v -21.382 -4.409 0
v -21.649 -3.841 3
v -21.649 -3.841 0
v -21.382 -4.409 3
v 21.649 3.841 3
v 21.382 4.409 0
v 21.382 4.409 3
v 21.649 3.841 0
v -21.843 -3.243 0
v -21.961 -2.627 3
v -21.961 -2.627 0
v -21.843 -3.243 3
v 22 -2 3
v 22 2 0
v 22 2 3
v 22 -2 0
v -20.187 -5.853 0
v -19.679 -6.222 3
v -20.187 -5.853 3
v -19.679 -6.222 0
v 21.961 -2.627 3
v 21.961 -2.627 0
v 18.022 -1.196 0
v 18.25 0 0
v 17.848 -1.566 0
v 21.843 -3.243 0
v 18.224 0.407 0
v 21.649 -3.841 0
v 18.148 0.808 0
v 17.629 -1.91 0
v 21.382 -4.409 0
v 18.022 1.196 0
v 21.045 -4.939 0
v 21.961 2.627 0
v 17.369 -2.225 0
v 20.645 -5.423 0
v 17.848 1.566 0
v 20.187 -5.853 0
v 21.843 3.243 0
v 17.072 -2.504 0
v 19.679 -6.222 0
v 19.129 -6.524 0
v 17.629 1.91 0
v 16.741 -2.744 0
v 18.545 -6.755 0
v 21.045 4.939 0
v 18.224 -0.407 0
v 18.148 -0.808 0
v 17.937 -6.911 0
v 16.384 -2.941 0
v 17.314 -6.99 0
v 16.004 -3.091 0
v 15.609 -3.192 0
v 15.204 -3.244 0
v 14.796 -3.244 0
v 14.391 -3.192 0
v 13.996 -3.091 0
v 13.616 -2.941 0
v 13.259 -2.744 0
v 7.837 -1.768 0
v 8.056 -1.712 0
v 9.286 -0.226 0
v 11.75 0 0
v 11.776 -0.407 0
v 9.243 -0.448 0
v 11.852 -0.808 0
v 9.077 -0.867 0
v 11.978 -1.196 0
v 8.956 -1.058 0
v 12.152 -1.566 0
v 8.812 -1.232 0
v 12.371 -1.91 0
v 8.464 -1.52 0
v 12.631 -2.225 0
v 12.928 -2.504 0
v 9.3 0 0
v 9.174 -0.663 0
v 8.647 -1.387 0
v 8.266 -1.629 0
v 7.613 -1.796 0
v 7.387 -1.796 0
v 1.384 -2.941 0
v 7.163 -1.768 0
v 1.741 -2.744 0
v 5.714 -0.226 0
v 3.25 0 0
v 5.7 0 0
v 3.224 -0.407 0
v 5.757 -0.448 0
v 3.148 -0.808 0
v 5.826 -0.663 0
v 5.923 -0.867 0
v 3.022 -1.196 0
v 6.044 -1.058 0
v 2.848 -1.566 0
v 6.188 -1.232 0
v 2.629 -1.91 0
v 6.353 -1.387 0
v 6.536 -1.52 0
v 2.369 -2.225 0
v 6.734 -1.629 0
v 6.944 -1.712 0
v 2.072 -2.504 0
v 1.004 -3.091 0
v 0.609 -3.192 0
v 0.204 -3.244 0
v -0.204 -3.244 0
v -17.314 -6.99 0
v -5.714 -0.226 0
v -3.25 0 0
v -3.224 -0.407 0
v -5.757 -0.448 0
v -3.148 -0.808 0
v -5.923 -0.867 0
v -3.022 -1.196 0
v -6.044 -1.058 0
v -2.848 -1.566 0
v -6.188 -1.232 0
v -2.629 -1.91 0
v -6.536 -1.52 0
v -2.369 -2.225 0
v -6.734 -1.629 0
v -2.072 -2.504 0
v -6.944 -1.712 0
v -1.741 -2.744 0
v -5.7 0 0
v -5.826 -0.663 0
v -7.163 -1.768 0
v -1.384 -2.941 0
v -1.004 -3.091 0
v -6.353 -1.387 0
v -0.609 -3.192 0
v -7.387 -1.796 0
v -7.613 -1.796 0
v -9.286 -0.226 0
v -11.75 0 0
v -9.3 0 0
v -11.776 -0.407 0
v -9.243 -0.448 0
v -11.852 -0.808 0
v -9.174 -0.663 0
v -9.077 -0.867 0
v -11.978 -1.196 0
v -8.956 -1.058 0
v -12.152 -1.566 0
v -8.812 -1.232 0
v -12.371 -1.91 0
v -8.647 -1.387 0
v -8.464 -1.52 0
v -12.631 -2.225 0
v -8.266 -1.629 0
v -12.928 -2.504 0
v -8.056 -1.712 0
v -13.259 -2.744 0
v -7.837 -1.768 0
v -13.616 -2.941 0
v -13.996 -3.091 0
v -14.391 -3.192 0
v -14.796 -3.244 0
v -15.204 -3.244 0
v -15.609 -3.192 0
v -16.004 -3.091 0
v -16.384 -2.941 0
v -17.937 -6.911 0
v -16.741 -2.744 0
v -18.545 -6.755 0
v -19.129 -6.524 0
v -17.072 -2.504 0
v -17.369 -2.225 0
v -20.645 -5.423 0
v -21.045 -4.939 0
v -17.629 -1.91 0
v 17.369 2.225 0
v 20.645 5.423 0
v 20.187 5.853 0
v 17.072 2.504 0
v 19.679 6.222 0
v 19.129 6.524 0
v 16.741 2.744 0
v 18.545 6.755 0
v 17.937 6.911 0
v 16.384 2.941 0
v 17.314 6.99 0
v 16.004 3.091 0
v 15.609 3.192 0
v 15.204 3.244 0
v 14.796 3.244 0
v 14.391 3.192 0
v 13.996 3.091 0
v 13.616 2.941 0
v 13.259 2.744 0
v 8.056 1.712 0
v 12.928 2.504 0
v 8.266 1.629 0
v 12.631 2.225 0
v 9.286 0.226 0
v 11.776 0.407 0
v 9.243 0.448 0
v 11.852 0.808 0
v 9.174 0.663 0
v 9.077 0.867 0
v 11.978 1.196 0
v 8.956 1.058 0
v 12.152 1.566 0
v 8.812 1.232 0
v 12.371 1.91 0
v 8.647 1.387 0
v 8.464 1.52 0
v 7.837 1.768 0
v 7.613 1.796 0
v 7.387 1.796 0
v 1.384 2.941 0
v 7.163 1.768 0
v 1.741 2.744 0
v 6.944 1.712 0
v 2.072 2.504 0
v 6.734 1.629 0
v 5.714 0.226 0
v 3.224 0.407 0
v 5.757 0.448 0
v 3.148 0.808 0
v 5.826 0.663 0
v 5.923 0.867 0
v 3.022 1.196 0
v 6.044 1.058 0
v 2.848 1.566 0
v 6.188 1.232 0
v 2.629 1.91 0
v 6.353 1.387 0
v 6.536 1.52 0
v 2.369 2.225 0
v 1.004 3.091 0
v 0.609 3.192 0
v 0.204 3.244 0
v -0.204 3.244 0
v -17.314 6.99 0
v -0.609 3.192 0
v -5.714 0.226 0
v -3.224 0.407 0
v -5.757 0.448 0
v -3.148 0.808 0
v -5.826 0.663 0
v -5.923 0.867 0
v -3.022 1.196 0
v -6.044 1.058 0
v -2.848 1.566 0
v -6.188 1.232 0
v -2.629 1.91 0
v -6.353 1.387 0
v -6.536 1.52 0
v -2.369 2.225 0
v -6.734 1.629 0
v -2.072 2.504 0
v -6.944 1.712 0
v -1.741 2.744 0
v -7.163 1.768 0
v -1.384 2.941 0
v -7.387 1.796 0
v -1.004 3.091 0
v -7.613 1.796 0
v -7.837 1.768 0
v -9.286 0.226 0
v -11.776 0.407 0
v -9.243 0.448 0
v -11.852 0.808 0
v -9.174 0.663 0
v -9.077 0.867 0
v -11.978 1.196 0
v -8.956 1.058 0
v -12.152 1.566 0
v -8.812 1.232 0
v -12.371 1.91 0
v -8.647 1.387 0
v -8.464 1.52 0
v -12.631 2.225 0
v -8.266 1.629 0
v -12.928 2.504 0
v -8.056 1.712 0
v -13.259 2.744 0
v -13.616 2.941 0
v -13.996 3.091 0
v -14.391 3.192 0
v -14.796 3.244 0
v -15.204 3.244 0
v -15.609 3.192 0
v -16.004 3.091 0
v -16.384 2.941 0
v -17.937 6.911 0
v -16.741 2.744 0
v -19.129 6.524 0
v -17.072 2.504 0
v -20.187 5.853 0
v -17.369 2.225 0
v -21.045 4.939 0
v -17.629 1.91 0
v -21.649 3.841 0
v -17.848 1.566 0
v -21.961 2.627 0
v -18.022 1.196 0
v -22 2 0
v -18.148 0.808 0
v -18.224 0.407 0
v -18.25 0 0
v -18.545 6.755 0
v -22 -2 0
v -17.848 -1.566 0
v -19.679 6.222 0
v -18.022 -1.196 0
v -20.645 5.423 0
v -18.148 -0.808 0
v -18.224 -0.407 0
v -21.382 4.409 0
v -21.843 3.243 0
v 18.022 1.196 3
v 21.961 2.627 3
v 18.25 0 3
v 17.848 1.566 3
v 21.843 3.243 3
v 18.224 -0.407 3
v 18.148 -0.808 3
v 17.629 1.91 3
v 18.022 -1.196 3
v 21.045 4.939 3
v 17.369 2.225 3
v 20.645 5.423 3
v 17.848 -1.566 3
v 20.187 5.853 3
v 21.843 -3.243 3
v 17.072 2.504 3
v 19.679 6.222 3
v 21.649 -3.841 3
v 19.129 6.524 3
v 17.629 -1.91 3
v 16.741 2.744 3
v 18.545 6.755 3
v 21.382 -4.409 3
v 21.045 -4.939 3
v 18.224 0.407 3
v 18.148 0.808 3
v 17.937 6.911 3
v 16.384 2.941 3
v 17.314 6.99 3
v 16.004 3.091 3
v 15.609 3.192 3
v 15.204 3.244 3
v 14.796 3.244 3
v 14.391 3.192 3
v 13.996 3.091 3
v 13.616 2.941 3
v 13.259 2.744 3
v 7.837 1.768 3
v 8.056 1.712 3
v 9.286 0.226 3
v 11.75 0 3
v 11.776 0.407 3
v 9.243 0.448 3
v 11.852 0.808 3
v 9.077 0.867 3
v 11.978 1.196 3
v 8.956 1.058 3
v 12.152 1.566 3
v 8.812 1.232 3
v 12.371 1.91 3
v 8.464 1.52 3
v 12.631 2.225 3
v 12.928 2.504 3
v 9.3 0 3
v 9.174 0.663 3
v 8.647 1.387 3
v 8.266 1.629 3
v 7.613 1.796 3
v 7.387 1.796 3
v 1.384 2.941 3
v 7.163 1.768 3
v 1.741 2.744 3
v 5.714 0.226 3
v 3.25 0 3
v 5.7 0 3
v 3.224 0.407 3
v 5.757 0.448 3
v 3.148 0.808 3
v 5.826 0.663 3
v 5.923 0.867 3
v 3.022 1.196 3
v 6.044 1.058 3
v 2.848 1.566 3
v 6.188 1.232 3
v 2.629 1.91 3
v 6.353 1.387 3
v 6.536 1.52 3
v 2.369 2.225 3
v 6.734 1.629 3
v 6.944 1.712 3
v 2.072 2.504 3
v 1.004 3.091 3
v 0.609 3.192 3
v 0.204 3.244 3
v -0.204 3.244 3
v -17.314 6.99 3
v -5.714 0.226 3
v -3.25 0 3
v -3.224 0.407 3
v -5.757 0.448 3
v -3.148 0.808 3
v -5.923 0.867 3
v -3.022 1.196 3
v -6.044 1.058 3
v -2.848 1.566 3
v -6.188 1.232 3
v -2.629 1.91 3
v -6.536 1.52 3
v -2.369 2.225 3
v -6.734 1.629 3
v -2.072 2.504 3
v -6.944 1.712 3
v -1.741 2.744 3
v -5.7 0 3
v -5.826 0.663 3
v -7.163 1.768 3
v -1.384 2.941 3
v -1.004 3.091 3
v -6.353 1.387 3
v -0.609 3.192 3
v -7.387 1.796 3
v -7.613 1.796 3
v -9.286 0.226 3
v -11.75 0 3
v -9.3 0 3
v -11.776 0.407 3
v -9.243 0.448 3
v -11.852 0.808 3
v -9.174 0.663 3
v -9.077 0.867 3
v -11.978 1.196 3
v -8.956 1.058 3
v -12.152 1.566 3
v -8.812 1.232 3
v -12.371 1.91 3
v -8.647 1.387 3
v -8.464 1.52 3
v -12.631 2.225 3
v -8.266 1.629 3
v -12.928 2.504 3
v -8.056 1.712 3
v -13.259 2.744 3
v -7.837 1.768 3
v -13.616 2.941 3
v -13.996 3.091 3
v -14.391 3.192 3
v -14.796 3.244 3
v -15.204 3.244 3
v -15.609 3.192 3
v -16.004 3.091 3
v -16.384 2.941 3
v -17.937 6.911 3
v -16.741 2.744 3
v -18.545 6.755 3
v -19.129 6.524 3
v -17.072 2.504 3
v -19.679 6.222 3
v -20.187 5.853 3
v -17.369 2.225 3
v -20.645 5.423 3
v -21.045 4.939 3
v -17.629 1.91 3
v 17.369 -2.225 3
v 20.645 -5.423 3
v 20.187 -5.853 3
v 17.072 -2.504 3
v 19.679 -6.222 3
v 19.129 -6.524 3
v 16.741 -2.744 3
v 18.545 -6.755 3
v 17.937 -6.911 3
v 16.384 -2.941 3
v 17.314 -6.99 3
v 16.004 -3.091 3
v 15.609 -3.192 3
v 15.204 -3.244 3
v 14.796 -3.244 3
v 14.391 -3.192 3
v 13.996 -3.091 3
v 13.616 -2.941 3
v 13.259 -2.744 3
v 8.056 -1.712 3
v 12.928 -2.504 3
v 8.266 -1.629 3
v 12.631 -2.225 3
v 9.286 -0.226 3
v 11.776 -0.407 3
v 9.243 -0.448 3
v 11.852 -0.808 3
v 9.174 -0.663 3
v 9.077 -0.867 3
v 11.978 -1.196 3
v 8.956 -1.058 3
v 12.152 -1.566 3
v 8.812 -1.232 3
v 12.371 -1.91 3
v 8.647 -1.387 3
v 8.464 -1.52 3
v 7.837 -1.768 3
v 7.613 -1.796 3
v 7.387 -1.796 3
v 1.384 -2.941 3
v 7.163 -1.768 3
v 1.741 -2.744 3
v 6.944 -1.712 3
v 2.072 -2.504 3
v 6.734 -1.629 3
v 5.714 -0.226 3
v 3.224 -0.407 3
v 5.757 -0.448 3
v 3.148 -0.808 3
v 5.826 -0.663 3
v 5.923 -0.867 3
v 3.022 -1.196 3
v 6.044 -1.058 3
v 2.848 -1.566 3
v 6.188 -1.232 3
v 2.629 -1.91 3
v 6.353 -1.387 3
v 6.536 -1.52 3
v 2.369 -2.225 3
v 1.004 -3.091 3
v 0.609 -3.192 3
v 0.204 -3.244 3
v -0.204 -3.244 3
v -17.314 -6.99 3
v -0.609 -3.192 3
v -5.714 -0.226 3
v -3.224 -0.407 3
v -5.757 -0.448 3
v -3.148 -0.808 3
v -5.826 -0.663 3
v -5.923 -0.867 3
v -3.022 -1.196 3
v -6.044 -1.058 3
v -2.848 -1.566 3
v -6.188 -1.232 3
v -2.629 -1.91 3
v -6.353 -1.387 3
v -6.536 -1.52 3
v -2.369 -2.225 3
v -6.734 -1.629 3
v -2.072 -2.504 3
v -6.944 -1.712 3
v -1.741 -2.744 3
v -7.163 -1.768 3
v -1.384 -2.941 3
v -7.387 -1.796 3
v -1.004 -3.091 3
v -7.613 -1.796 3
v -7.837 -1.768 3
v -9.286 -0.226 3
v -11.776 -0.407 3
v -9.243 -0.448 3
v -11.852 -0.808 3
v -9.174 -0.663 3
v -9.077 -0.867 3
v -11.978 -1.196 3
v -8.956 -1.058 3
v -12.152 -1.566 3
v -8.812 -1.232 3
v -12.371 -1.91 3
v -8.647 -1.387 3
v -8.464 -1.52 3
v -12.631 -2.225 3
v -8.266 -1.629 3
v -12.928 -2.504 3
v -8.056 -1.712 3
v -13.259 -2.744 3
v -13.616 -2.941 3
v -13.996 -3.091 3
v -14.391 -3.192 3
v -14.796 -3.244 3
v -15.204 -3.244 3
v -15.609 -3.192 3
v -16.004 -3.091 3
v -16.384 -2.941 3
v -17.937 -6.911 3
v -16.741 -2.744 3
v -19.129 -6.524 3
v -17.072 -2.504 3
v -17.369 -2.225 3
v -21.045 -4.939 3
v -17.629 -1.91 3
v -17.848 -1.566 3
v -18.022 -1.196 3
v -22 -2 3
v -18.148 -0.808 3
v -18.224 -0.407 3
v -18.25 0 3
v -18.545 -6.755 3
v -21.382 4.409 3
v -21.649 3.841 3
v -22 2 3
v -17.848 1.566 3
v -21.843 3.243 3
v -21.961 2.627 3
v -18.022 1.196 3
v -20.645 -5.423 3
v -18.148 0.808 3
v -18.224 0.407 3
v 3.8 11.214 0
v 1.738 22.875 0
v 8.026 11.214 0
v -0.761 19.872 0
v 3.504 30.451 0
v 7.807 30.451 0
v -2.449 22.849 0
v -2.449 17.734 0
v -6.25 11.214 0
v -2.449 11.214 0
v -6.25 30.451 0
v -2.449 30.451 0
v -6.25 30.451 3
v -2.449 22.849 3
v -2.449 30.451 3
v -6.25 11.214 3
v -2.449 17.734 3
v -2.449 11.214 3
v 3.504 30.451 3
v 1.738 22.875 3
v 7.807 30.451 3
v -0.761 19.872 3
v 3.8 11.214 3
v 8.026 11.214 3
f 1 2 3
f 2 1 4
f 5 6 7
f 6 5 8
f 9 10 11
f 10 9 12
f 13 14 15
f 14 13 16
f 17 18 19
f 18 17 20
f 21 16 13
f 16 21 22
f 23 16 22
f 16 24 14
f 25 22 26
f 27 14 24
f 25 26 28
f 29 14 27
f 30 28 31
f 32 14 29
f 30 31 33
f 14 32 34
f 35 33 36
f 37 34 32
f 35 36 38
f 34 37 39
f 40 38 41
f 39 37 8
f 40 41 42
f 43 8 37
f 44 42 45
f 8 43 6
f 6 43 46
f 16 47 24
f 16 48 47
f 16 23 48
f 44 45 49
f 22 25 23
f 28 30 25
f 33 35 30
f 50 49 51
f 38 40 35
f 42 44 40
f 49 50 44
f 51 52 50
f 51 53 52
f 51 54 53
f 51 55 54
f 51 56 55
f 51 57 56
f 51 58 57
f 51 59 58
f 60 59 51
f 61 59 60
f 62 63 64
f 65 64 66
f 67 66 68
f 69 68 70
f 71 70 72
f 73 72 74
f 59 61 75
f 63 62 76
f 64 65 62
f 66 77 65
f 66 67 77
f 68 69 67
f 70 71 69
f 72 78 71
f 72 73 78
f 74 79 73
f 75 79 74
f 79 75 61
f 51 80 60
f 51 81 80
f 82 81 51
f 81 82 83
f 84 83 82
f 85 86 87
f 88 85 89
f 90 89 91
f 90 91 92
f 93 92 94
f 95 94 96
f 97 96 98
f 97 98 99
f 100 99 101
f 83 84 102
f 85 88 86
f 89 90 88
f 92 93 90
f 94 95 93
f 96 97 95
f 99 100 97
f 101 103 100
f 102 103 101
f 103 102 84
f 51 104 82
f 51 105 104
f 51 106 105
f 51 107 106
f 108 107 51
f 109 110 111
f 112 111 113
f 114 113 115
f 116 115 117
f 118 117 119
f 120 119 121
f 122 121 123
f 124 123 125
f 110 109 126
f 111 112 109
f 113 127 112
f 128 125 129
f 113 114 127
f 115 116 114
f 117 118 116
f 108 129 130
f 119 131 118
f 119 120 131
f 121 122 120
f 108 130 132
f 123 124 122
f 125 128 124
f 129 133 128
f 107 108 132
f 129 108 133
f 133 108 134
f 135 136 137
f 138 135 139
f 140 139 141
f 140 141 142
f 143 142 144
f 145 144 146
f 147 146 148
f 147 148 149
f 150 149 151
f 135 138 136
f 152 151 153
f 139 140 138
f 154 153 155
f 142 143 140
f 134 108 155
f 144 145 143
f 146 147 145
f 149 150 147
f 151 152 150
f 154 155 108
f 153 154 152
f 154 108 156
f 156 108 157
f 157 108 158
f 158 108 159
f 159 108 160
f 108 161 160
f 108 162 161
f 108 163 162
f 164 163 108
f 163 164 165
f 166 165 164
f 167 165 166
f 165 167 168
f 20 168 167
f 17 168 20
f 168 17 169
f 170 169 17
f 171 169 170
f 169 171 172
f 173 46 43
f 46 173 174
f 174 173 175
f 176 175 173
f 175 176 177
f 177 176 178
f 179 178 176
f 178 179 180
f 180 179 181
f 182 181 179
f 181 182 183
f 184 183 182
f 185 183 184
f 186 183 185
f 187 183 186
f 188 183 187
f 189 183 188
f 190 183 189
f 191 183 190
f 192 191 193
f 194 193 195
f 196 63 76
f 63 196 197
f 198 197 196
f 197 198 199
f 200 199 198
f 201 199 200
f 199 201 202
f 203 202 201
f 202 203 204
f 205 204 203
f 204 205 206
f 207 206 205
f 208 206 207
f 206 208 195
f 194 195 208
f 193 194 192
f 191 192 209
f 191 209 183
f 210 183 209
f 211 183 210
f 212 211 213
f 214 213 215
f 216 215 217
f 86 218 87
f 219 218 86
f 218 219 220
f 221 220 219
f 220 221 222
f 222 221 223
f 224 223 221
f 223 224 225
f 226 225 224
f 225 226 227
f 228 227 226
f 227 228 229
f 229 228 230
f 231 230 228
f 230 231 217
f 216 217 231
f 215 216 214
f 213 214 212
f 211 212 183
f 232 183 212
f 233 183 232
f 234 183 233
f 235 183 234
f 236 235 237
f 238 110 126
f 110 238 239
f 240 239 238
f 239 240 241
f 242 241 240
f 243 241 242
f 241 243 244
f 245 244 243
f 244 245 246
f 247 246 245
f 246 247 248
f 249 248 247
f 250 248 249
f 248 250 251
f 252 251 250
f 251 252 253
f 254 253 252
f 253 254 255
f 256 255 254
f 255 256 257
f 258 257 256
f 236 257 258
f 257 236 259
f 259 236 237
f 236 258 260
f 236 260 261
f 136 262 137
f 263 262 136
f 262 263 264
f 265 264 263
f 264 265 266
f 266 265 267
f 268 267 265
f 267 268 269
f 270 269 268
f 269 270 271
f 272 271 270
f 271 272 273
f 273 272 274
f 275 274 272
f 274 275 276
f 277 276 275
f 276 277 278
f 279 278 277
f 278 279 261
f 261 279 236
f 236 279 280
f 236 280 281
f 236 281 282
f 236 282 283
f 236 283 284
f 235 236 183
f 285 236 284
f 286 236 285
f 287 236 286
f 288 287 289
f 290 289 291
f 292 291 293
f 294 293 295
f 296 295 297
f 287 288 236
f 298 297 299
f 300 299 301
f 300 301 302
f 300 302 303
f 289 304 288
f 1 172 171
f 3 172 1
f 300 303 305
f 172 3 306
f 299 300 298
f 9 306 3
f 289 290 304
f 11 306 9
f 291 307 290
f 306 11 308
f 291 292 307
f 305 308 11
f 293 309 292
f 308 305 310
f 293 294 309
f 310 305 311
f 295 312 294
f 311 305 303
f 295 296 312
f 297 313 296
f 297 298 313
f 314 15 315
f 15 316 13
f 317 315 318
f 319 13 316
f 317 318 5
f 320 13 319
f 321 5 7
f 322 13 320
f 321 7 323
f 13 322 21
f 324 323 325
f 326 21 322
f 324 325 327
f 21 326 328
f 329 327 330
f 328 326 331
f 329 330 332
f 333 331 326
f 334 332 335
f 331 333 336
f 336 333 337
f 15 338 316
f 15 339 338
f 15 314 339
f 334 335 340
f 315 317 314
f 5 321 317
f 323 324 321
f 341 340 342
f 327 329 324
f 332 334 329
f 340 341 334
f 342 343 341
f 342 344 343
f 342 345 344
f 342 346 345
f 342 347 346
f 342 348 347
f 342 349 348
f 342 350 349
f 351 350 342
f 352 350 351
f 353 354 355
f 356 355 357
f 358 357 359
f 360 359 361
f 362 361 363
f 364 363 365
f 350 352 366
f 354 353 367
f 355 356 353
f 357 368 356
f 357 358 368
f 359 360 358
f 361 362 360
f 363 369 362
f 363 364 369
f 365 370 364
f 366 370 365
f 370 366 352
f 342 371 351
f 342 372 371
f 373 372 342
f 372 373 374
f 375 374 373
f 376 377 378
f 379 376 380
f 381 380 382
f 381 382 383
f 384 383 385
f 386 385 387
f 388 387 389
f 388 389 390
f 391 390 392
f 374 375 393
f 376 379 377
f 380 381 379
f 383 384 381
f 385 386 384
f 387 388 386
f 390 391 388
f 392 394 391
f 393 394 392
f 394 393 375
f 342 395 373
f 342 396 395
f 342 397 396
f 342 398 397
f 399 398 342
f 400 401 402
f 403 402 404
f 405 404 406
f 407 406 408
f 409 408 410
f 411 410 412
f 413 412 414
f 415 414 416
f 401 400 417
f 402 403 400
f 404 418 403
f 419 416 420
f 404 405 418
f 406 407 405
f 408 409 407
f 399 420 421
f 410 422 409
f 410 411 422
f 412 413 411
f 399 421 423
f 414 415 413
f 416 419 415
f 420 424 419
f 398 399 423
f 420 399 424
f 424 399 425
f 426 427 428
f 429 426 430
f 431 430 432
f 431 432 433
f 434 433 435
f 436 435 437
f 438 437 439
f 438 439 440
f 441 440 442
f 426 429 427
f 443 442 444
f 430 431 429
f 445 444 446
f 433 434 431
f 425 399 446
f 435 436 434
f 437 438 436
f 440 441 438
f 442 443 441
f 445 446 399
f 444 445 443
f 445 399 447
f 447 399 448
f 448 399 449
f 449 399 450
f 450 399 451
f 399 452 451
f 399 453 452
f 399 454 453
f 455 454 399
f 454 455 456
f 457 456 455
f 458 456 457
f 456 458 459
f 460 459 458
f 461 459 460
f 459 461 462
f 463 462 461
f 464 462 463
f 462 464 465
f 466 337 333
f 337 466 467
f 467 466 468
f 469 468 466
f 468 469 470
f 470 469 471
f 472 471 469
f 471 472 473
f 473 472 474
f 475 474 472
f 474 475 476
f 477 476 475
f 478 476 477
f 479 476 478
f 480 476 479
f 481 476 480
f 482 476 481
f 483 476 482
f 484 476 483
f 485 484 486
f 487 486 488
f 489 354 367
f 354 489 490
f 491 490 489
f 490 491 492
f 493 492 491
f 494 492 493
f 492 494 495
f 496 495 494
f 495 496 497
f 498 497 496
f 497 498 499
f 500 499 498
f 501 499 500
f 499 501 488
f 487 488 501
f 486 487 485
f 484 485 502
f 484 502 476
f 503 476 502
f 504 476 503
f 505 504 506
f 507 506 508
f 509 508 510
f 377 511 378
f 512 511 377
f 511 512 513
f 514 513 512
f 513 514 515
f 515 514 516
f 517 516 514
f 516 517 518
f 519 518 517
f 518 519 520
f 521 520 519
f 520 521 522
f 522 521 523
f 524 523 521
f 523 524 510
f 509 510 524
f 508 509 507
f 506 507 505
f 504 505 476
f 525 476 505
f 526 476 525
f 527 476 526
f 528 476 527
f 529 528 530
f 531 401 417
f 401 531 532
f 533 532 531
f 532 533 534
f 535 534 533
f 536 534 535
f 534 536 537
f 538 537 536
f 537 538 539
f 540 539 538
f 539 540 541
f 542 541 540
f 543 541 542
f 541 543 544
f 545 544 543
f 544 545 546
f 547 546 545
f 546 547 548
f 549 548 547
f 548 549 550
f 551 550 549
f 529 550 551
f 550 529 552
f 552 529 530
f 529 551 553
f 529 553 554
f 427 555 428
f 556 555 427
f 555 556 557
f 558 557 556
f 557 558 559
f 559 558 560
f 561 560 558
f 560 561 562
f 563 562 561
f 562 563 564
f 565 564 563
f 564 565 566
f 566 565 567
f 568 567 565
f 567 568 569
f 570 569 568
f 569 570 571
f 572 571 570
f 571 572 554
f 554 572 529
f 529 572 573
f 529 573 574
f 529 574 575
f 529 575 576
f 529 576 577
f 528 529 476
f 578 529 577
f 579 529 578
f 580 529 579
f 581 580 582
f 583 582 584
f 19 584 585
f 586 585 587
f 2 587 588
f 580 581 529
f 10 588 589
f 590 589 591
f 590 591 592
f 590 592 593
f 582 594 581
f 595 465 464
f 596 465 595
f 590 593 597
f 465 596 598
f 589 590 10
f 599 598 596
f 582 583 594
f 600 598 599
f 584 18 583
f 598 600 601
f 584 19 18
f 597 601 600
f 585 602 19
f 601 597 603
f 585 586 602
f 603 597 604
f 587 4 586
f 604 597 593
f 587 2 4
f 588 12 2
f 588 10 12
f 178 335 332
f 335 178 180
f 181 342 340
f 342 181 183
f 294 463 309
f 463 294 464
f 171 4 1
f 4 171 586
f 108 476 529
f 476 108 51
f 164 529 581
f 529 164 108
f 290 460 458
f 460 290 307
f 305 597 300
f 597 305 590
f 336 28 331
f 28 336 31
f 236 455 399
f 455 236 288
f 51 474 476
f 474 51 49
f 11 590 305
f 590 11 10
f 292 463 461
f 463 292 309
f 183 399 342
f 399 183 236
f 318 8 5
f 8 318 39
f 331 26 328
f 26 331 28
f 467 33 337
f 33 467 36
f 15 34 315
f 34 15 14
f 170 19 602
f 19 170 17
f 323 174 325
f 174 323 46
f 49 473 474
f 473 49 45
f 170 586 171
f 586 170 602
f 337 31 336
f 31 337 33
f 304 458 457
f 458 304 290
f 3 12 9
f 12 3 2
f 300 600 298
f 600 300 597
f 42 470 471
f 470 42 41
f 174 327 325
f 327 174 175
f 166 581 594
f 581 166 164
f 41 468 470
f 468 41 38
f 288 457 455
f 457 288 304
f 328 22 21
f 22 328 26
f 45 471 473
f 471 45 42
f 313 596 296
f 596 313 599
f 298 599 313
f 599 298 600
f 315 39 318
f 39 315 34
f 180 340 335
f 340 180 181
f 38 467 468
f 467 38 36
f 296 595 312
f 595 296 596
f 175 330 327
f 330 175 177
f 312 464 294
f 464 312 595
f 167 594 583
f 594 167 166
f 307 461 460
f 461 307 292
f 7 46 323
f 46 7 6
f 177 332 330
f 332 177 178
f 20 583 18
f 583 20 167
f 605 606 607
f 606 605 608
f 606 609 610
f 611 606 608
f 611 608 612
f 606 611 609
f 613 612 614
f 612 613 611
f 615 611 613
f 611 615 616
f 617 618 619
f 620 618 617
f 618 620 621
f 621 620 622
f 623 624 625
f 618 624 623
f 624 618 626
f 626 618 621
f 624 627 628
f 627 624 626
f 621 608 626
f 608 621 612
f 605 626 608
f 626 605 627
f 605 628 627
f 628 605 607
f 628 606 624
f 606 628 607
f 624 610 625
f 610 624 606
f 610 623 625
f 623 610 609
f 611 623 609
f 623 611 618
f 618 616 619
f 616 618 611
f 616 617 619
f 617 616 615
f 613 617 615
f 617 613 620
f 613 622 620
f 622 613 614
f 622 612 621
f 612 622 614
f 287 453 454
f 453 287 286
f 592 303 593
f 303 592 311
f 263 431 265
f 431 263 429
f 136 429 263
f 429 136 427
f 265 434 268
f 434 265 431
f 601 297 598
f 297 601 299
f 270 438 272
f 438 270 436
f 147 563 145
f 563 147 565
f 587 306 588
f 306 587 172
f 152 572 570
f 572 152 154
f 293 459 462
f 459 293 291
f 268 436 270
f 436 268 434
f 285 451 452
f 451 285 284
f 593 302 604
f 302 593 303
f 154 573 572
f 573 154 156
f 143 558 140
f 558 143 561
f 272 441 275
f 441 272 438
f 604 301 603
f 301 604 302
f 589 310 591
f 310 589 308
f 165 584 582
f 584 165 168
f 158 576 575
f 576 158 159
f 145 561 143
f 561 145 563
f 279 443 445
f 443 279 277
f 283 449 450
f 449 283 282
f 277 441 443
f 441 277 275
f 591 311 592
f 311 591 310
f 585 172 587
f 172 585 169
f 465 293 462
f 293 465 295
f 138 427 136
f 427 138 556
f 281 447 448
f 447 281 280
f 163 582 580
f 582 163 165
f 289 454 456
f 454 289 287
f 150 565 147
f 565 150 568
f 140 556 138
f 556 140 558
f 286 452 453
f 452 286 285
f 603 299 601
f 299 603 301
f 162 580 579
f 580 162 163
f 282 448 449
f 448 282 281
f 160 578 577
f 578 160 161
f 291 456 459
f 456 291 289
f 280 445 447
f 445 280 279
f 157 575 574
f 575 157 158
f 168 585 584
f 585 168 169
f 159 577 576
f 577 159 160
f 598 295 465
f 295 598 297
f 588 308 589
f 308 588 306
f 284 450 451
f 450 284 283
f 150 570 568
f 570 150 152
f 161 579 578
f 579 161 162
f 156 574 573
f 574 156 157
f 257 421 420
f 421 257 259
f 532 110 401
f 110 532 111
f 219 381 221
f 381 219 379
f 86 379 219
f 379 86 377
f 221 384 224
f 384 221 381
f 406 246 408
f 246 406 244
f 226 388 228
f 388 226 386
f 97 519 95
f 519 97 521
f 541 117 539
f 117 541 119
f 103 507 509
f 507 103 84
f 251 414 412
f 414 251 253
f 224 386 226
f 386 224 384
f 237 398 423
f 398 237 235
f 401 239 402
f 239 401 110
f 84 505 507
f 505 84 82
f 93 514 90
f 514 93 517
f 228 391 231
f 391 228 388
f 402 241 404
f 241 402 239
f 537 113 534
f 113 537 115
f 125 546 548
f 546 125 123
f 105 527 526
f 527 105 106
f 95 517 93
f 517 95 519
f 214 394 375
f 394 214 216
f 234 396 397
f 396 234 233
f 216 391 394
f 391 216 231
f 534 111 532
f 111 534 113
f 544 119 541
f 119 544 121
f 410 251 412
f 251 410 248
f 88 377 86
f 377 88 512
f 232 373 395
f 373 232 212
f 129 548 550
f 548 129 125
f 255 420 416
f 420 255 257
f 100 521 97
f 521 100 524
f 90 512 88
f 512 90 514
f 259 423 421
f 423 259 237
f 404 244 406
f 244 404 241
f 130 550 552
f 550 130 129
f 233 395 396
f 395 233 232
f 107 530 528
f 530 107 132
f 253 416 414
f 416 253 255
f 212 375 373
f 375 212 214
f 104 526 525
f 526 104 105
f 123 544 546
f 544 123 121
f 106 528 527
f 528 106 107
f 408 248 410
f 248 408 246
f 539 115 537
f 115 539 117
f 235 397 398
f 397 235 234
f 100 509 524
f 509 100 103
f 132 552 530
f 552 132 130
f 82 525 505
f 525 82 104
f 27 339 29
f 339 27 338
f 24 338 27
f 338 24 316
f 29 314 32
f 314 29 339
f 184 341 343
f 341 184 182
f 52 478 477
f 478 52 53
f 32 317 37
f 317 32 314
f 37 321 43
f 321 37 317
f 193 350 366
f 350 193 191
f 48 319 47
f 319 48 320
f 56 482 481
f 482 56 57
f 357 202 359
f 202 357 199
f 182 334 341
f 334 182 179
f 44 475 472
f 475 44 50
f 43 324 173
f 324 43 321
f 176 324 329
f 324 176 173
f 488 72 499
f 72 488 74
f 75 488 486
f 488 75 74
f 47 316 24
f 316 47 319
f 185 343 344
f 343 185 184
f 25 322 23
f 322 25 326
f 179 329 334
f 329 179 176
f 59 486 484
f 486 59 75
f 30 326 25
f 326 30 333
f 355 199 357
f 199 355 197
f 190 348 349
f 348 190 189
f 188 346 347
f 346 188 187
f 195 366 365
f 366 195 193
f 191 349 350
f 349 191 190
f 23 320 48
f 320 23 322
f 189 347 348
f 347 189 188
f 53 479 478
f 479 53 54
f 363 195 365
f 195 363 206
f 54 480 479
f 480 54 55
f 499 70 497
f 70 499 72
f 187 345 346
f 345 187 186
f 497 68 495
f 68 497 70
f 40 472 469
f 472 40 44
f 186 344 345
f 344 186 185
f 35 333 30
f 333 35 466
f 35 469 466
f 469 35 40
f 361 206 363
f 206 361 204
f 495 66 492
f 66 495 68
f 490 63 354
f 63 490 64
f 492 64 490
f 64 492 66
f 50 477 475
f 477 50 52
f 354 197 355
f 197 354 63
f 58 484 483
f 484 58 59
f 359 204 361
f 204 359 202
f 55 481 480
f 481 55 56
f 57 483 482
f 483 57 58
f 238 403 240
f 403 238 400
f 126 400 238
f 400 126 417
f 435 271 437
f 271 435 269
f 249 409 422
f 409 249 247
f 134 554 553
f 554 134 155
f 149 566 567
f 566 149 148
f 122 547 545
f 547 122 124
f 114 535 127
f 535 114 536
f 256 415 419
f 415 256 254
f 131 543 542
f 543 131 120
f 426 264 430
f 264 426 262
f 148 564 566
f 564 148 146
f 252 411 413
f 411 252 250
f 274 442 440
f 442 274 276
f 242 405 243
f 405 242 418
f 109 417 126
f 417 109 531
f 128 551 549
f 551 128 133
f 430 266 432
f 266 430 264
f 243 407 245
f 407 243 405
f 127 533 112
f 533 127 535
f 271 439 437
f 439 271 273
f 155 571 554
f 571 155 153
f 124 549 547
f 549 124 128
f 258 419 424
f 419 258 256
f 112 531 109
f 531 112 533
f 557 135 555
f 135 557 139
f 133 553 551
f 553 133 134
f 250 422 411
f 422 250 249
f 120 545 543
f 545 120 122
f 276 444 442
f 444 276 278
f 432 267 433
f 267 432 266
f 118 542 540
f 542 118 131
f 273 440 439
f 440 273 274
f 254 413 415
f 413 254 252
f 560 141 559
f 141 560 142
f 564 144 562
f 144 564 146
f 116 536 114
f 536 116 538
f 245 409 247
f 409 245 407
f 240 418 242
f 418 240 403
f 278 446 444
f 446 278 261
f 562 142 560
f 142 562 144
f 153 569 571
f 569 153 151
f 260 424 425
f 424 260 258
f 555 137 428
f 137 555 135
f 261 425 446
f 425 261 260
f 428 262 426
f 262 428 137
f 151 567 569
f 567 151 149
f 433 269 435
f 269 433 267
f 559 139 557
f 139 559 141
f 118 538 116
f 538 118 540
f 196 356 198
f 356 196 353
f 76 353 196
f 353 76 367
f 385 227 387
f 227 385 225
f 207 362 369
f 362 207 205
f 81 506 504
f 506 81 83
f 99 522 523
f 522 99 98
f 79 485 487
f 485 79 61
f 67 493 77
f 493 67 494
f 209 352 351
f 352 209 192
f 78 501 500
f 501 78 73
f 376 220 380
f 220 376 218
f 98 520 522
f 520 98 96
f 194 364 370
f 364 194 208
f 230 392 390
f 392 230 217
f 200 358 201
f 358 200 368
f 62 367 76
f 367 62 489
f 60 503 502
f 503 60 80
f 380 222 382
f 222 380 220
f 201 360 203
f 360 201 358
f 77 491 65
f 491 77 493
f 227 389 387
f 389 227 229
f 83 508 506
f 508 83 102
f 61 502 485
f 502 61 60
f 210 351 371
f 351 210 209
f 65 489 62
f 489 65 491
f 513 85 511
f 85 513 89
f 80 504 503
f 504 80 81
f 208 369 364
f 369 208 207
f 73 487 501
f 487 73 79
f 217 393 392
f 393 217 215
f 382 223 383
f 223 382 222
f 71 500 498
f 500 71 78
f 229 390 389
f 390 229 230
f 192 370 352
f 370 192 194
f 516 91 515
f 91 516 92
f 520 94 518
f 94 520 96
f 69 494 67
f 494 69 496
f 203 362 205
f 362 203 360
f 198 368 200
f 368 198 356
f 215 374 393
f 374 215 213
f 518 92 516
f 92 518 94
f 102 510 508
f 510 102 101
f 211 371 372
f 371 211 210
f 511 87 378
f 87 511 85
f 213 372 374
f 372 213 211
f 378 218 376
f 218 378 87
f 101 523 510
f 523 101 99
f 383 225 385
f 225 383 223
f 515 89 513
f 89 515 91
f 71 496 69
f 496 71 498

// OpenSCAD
$fn = 50;


difference() {
	union() {
		hull() {
			translate(v = [-17.0000000000, 2.0000000000, 0]) {
				cylinder(h = 3, r = 5);
			}
			translate(v = [17.0000000000, 2.0000000000, 0]) {
				cylinder(h = 3, r = 5);
			}
			translate(v = [-17.0000000000, -2.0000000000, 0]) {
				cylinder(h = 3, r = 5);
			}
			translate(v = [17.0000000000, -2.0000000000, 0]) {
				cylinder(h = 3, r = 5);
			}
		}
		translate(v = [0, 30.0000000000, 0]) {
			linear_extrude(height = 3) {
				text(font = "DejaVu Sans Mono:style=Bold", halign = "center", size = 19.0000000000, text = "K", valign = "top");
			}
		}
	}
	union() {
		translate(v = [-15.0000000000, 0.0000000000, 0]) {
			translate(v = [0, 0, -100]) {
				cylinder(h = 200, r = 3.2500000000);
			}
		}
		translate(v = [0, 0, -100]) {
			cylinder(h = 200, r = 3.2500000000);
		}
		translate(v = [15.0000000000, 0.0000000000, 0]) {
			translate(v = [0, 0, -100]) {
				cylinder(h = 200, r = 3.2500000000);
			}
		}
		translate(v = [-15.0000000000, 0.0000000000, 0]) {
			translate(v = [0, 0, -100]) {
				cylinder(h = 200, r = 1.8000000000);
			}
		}
		translate(v = [-7.5000000000, 0.0000000000, 0]) {
			translate(v = [0, 0, -100]) {
				cylinder(h = 200, r = 1.8000000000);
			}
		}
		translate(v = [0, 0, -100]) {
			cylinder(h = 200, r = 1.8000000000);
		}
		translate(v = [7.5000000000, 0.0000000000, 0]) {
			translate(v = [0, 0, -100]) {
				cylinder(h = 200, r = 1.8000000000);
			}
		}
		translate(v = [15.0000000000, 0.0000000000, 0]) {
			translate(v = [0, 0, -100]) {
				cylinder(h = 200, r = 1.8000000000);
			}
		}
	}
}
